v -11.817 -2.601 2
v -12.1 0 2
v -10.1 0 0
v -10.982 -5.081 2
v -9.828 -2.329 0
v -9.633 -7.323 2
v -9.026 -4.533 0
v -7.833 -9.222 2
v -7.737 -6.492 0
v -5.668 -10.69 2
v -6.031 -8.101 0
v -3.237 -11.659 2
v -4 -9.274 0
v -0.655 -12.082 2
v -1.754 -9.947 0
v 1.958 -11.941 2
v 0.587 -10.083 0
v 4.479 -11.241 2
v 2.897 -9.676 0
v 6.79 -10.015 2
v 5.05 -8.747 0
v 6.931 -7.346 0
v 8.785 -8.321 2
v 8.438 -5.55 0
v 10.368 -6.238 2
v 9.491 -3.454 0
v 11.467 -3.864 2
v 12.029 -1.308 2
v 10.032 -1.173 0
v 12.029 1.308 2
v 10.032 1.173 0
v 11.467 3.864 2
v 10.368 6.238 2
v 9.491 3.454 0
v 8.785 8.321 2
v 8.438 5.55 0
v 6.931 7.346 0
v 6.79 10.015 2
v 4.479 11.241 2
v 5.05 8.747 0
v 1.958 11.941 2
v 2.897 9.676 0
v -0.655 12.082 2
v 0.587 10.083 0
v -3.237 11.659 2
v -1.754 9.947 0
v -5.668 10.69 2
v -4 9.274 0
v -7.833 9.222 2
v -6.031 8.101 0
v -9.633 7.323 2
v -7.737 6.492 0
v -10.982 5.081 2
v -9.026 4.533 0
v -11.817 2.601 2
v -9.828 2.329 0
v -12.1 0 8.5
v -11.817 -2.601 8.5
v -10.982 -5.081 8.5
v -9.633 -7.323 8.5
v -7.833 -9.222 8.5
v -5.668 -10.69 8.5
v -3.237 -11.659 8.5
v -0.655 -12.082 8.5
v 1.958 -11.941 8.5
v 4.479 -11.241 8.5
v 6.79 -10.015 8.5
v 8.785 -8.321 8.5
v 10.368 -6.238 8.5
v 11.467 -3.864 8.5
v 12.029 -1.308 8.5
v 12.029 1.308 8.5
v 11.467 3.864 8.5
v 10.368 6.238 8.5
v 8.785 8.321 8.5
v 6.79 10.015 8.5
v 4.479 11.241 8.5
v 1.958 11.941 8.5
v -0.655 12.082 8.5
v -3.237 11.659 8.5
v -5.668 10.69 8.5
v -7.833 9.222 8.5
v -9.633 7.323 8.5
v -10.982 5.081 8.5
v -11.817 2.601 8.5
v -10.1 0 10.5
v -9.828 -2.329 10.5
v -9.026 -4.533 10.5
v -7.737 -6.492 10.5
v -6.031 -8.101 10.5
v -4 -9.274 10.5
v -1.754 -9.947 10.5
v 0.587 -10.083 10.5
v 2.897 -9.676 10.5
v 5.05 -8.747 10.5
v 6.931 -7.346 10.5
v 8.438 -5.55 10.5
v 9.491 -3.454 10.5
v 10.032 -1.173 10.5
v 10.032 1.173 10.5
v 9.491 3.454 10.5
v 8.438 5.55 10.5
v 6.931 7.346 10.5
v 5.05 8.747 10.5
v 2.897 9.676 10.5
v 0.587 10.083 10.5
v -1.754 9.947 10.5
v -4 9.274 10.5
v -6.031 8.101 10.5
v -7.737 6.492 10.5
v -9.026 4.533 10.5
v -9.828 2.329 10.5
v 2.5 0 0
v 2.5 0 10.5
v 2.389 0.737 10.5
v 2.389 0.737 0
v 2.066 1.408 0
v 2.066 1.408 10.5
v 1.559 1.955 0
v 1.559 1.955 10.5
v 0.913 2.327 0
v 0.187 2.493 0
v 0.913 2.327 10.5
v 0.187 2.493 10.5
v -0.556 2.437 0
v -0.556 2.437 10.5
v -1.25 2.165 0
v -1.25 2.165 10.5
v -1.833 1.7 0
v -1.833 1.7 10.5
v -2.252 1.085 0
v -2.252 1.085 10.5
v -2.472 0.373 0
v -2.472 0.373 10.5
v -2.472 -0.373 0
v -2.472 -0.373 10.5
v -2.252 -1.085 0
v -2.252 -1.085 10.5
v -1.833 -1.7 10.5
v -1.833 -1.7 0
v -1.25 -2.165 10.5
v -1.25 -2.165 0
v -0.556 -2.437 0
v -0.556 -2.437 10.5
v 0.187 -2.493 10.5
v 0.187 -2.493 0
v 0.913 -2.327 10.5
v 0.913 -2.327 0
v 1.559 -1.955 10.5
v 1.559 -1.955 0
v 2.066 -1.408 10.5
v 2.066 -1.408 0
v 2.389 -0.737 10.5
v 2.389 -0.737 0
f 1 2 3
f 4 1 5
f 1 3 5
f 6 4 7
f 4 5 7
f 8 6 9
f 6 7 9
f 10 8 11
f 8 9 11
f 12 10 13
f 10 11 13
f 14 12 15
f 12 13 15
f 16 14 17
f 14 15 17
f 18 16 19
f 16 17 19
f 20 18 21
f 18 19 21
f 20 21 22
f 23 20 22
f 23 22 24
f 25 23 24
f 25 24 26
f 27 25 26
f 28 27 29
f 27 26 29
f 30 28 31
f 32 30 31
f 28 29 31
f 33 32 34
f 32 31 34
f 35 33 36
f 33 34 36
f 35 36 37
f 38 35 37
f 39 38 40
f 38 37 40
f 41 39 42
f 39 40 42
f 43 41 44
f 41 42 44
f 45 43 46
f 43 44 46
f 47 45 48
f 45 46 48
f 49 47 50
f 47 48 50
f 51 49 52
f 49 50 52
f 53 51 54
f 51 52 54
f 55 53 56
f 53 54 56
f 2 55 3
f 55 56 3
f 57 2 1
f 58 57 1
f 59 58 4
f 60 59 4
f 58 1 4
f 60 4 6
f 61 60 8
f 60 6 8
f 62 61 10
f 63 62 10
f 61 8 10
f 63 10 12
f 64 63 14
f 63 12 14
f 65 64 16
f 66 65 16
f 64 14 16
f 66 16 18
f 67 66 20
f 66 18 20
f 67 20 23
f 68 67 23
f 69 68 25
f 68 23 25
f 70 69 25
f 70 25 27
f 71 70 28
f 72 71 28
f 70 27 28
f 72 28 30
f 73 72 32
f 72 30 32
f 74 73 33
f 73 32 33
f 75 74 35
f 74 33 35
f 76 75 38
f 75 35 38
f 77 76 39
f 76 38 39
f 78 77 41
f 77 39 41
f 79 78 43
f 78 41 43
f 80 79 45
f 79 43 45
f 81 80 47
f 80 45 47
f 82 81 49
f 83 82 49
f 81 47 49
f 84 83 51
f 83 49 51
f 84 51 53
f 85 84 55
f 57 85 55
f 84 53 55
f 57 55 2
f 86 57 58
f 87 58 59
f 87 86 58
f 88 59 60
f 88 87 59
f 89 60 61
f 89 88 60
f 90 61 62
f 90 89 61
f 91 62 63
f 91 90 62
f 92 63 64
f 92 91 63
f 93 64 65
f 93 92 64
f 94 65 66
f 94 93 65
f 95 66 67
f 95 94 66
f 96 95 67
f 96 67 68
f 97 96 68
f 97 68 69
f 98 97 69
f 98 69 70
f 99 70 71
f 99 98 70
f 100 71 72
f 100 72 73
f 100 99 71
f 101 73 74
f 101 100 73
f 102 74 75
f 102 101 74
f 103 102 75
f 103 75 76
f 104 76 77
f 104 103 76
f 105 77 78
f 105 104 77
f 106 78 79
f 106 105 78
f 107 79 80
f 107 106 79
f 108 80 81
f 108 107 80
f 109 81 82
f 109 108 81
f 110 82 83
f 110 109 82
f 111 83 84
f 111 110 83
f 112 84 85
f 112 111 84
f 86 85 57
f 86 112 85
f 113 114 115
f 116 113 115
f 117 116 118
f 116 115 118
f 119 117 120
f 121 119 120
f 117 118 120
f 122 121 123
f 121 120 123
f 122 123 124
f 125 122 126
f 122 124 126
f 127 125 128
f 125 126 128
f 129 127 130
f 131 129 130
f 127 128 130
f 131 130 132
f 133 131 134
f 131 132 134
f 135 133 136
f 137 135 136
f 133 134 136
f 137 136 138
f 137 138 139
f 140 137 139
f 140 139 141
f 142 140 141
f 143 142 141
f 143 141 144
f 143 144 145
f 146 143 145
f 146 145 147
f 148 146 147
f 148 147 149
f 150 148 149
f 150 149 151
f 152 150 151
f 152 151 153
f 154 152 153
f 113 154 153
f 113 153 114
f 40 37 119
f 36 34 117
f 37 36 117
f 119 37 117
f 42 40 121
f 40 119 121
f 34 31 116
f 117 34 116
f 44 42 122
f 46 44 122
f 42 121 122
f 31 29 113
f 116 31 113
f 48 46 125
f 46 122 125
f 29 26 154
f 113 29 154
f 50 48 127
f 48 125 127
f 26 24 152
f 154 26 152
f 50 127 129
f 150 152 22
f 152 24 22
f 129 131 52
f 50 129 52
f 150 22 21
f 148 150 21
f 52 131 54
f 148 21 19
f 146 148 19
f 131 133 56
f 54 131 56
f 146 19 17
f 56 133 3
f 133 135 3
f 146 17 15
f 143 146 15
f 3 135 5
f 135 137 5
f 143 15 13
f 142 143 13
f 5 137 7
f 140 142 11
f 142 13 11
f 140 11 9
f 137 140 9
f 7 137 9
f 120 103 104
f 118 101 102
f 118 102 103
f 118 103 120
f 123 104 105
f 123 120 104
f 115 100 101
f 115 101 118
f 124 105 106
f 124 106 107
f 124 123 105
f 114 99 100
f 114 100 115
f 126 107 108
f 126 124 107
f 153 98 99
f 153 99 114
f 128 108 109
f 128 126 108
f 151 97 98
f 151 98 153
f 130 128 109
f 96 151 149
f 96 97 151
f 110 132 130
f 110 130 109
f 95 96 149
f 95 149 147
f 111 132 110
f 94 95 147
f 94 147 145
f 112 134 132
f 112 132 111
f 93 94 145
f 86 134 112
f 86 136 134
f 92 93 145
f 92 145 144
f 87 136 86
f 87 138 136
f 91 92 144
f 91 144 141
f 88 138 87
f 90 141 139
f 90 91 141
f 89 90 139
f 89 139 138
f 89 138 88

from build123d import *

# Parameters (mm, degrees)
SKETCH1_R           = 12.1
BOSS_EXTRUDE1_DEPTH = 10.5
SKETCH2_R           = 2.5
CUT_EXTRUDE1_DEPTH  = 21.076603298
CHAMFER1_SIZE       = 2


with BuildPart() as part:
    # Sketch1 → Boss-Extrude1 (new body)
    with BuildSketch(Plane.XY):
        with Locations(Location((0, 0, 0), (0, 0, 180))):
            Circle(SKETCH1_R)
    extrude(amount=BOSS_EXTRUDE1_DEPTH)

    # Sketch2 → Cut-Extrude1 (cut, through all)
    with BuildSketch(Plane.XY.offset(10.5)):
        Circle(SKETCH2_R)
    extrude(amount=-CUT_EXTRUDE1_DEPTH, mode=Mode.SUBTRACT)

    # Chamfer1
    chamfer1_edges = [part.edges().sort_by_distance(p)[0] for p in [
        (12.1, 0, 0),
        (12.1, 0, 10.5),
    ]]
    chamfer(chamfer1_edges, length=CHAMFER1_SIZE)


solid = part.part
